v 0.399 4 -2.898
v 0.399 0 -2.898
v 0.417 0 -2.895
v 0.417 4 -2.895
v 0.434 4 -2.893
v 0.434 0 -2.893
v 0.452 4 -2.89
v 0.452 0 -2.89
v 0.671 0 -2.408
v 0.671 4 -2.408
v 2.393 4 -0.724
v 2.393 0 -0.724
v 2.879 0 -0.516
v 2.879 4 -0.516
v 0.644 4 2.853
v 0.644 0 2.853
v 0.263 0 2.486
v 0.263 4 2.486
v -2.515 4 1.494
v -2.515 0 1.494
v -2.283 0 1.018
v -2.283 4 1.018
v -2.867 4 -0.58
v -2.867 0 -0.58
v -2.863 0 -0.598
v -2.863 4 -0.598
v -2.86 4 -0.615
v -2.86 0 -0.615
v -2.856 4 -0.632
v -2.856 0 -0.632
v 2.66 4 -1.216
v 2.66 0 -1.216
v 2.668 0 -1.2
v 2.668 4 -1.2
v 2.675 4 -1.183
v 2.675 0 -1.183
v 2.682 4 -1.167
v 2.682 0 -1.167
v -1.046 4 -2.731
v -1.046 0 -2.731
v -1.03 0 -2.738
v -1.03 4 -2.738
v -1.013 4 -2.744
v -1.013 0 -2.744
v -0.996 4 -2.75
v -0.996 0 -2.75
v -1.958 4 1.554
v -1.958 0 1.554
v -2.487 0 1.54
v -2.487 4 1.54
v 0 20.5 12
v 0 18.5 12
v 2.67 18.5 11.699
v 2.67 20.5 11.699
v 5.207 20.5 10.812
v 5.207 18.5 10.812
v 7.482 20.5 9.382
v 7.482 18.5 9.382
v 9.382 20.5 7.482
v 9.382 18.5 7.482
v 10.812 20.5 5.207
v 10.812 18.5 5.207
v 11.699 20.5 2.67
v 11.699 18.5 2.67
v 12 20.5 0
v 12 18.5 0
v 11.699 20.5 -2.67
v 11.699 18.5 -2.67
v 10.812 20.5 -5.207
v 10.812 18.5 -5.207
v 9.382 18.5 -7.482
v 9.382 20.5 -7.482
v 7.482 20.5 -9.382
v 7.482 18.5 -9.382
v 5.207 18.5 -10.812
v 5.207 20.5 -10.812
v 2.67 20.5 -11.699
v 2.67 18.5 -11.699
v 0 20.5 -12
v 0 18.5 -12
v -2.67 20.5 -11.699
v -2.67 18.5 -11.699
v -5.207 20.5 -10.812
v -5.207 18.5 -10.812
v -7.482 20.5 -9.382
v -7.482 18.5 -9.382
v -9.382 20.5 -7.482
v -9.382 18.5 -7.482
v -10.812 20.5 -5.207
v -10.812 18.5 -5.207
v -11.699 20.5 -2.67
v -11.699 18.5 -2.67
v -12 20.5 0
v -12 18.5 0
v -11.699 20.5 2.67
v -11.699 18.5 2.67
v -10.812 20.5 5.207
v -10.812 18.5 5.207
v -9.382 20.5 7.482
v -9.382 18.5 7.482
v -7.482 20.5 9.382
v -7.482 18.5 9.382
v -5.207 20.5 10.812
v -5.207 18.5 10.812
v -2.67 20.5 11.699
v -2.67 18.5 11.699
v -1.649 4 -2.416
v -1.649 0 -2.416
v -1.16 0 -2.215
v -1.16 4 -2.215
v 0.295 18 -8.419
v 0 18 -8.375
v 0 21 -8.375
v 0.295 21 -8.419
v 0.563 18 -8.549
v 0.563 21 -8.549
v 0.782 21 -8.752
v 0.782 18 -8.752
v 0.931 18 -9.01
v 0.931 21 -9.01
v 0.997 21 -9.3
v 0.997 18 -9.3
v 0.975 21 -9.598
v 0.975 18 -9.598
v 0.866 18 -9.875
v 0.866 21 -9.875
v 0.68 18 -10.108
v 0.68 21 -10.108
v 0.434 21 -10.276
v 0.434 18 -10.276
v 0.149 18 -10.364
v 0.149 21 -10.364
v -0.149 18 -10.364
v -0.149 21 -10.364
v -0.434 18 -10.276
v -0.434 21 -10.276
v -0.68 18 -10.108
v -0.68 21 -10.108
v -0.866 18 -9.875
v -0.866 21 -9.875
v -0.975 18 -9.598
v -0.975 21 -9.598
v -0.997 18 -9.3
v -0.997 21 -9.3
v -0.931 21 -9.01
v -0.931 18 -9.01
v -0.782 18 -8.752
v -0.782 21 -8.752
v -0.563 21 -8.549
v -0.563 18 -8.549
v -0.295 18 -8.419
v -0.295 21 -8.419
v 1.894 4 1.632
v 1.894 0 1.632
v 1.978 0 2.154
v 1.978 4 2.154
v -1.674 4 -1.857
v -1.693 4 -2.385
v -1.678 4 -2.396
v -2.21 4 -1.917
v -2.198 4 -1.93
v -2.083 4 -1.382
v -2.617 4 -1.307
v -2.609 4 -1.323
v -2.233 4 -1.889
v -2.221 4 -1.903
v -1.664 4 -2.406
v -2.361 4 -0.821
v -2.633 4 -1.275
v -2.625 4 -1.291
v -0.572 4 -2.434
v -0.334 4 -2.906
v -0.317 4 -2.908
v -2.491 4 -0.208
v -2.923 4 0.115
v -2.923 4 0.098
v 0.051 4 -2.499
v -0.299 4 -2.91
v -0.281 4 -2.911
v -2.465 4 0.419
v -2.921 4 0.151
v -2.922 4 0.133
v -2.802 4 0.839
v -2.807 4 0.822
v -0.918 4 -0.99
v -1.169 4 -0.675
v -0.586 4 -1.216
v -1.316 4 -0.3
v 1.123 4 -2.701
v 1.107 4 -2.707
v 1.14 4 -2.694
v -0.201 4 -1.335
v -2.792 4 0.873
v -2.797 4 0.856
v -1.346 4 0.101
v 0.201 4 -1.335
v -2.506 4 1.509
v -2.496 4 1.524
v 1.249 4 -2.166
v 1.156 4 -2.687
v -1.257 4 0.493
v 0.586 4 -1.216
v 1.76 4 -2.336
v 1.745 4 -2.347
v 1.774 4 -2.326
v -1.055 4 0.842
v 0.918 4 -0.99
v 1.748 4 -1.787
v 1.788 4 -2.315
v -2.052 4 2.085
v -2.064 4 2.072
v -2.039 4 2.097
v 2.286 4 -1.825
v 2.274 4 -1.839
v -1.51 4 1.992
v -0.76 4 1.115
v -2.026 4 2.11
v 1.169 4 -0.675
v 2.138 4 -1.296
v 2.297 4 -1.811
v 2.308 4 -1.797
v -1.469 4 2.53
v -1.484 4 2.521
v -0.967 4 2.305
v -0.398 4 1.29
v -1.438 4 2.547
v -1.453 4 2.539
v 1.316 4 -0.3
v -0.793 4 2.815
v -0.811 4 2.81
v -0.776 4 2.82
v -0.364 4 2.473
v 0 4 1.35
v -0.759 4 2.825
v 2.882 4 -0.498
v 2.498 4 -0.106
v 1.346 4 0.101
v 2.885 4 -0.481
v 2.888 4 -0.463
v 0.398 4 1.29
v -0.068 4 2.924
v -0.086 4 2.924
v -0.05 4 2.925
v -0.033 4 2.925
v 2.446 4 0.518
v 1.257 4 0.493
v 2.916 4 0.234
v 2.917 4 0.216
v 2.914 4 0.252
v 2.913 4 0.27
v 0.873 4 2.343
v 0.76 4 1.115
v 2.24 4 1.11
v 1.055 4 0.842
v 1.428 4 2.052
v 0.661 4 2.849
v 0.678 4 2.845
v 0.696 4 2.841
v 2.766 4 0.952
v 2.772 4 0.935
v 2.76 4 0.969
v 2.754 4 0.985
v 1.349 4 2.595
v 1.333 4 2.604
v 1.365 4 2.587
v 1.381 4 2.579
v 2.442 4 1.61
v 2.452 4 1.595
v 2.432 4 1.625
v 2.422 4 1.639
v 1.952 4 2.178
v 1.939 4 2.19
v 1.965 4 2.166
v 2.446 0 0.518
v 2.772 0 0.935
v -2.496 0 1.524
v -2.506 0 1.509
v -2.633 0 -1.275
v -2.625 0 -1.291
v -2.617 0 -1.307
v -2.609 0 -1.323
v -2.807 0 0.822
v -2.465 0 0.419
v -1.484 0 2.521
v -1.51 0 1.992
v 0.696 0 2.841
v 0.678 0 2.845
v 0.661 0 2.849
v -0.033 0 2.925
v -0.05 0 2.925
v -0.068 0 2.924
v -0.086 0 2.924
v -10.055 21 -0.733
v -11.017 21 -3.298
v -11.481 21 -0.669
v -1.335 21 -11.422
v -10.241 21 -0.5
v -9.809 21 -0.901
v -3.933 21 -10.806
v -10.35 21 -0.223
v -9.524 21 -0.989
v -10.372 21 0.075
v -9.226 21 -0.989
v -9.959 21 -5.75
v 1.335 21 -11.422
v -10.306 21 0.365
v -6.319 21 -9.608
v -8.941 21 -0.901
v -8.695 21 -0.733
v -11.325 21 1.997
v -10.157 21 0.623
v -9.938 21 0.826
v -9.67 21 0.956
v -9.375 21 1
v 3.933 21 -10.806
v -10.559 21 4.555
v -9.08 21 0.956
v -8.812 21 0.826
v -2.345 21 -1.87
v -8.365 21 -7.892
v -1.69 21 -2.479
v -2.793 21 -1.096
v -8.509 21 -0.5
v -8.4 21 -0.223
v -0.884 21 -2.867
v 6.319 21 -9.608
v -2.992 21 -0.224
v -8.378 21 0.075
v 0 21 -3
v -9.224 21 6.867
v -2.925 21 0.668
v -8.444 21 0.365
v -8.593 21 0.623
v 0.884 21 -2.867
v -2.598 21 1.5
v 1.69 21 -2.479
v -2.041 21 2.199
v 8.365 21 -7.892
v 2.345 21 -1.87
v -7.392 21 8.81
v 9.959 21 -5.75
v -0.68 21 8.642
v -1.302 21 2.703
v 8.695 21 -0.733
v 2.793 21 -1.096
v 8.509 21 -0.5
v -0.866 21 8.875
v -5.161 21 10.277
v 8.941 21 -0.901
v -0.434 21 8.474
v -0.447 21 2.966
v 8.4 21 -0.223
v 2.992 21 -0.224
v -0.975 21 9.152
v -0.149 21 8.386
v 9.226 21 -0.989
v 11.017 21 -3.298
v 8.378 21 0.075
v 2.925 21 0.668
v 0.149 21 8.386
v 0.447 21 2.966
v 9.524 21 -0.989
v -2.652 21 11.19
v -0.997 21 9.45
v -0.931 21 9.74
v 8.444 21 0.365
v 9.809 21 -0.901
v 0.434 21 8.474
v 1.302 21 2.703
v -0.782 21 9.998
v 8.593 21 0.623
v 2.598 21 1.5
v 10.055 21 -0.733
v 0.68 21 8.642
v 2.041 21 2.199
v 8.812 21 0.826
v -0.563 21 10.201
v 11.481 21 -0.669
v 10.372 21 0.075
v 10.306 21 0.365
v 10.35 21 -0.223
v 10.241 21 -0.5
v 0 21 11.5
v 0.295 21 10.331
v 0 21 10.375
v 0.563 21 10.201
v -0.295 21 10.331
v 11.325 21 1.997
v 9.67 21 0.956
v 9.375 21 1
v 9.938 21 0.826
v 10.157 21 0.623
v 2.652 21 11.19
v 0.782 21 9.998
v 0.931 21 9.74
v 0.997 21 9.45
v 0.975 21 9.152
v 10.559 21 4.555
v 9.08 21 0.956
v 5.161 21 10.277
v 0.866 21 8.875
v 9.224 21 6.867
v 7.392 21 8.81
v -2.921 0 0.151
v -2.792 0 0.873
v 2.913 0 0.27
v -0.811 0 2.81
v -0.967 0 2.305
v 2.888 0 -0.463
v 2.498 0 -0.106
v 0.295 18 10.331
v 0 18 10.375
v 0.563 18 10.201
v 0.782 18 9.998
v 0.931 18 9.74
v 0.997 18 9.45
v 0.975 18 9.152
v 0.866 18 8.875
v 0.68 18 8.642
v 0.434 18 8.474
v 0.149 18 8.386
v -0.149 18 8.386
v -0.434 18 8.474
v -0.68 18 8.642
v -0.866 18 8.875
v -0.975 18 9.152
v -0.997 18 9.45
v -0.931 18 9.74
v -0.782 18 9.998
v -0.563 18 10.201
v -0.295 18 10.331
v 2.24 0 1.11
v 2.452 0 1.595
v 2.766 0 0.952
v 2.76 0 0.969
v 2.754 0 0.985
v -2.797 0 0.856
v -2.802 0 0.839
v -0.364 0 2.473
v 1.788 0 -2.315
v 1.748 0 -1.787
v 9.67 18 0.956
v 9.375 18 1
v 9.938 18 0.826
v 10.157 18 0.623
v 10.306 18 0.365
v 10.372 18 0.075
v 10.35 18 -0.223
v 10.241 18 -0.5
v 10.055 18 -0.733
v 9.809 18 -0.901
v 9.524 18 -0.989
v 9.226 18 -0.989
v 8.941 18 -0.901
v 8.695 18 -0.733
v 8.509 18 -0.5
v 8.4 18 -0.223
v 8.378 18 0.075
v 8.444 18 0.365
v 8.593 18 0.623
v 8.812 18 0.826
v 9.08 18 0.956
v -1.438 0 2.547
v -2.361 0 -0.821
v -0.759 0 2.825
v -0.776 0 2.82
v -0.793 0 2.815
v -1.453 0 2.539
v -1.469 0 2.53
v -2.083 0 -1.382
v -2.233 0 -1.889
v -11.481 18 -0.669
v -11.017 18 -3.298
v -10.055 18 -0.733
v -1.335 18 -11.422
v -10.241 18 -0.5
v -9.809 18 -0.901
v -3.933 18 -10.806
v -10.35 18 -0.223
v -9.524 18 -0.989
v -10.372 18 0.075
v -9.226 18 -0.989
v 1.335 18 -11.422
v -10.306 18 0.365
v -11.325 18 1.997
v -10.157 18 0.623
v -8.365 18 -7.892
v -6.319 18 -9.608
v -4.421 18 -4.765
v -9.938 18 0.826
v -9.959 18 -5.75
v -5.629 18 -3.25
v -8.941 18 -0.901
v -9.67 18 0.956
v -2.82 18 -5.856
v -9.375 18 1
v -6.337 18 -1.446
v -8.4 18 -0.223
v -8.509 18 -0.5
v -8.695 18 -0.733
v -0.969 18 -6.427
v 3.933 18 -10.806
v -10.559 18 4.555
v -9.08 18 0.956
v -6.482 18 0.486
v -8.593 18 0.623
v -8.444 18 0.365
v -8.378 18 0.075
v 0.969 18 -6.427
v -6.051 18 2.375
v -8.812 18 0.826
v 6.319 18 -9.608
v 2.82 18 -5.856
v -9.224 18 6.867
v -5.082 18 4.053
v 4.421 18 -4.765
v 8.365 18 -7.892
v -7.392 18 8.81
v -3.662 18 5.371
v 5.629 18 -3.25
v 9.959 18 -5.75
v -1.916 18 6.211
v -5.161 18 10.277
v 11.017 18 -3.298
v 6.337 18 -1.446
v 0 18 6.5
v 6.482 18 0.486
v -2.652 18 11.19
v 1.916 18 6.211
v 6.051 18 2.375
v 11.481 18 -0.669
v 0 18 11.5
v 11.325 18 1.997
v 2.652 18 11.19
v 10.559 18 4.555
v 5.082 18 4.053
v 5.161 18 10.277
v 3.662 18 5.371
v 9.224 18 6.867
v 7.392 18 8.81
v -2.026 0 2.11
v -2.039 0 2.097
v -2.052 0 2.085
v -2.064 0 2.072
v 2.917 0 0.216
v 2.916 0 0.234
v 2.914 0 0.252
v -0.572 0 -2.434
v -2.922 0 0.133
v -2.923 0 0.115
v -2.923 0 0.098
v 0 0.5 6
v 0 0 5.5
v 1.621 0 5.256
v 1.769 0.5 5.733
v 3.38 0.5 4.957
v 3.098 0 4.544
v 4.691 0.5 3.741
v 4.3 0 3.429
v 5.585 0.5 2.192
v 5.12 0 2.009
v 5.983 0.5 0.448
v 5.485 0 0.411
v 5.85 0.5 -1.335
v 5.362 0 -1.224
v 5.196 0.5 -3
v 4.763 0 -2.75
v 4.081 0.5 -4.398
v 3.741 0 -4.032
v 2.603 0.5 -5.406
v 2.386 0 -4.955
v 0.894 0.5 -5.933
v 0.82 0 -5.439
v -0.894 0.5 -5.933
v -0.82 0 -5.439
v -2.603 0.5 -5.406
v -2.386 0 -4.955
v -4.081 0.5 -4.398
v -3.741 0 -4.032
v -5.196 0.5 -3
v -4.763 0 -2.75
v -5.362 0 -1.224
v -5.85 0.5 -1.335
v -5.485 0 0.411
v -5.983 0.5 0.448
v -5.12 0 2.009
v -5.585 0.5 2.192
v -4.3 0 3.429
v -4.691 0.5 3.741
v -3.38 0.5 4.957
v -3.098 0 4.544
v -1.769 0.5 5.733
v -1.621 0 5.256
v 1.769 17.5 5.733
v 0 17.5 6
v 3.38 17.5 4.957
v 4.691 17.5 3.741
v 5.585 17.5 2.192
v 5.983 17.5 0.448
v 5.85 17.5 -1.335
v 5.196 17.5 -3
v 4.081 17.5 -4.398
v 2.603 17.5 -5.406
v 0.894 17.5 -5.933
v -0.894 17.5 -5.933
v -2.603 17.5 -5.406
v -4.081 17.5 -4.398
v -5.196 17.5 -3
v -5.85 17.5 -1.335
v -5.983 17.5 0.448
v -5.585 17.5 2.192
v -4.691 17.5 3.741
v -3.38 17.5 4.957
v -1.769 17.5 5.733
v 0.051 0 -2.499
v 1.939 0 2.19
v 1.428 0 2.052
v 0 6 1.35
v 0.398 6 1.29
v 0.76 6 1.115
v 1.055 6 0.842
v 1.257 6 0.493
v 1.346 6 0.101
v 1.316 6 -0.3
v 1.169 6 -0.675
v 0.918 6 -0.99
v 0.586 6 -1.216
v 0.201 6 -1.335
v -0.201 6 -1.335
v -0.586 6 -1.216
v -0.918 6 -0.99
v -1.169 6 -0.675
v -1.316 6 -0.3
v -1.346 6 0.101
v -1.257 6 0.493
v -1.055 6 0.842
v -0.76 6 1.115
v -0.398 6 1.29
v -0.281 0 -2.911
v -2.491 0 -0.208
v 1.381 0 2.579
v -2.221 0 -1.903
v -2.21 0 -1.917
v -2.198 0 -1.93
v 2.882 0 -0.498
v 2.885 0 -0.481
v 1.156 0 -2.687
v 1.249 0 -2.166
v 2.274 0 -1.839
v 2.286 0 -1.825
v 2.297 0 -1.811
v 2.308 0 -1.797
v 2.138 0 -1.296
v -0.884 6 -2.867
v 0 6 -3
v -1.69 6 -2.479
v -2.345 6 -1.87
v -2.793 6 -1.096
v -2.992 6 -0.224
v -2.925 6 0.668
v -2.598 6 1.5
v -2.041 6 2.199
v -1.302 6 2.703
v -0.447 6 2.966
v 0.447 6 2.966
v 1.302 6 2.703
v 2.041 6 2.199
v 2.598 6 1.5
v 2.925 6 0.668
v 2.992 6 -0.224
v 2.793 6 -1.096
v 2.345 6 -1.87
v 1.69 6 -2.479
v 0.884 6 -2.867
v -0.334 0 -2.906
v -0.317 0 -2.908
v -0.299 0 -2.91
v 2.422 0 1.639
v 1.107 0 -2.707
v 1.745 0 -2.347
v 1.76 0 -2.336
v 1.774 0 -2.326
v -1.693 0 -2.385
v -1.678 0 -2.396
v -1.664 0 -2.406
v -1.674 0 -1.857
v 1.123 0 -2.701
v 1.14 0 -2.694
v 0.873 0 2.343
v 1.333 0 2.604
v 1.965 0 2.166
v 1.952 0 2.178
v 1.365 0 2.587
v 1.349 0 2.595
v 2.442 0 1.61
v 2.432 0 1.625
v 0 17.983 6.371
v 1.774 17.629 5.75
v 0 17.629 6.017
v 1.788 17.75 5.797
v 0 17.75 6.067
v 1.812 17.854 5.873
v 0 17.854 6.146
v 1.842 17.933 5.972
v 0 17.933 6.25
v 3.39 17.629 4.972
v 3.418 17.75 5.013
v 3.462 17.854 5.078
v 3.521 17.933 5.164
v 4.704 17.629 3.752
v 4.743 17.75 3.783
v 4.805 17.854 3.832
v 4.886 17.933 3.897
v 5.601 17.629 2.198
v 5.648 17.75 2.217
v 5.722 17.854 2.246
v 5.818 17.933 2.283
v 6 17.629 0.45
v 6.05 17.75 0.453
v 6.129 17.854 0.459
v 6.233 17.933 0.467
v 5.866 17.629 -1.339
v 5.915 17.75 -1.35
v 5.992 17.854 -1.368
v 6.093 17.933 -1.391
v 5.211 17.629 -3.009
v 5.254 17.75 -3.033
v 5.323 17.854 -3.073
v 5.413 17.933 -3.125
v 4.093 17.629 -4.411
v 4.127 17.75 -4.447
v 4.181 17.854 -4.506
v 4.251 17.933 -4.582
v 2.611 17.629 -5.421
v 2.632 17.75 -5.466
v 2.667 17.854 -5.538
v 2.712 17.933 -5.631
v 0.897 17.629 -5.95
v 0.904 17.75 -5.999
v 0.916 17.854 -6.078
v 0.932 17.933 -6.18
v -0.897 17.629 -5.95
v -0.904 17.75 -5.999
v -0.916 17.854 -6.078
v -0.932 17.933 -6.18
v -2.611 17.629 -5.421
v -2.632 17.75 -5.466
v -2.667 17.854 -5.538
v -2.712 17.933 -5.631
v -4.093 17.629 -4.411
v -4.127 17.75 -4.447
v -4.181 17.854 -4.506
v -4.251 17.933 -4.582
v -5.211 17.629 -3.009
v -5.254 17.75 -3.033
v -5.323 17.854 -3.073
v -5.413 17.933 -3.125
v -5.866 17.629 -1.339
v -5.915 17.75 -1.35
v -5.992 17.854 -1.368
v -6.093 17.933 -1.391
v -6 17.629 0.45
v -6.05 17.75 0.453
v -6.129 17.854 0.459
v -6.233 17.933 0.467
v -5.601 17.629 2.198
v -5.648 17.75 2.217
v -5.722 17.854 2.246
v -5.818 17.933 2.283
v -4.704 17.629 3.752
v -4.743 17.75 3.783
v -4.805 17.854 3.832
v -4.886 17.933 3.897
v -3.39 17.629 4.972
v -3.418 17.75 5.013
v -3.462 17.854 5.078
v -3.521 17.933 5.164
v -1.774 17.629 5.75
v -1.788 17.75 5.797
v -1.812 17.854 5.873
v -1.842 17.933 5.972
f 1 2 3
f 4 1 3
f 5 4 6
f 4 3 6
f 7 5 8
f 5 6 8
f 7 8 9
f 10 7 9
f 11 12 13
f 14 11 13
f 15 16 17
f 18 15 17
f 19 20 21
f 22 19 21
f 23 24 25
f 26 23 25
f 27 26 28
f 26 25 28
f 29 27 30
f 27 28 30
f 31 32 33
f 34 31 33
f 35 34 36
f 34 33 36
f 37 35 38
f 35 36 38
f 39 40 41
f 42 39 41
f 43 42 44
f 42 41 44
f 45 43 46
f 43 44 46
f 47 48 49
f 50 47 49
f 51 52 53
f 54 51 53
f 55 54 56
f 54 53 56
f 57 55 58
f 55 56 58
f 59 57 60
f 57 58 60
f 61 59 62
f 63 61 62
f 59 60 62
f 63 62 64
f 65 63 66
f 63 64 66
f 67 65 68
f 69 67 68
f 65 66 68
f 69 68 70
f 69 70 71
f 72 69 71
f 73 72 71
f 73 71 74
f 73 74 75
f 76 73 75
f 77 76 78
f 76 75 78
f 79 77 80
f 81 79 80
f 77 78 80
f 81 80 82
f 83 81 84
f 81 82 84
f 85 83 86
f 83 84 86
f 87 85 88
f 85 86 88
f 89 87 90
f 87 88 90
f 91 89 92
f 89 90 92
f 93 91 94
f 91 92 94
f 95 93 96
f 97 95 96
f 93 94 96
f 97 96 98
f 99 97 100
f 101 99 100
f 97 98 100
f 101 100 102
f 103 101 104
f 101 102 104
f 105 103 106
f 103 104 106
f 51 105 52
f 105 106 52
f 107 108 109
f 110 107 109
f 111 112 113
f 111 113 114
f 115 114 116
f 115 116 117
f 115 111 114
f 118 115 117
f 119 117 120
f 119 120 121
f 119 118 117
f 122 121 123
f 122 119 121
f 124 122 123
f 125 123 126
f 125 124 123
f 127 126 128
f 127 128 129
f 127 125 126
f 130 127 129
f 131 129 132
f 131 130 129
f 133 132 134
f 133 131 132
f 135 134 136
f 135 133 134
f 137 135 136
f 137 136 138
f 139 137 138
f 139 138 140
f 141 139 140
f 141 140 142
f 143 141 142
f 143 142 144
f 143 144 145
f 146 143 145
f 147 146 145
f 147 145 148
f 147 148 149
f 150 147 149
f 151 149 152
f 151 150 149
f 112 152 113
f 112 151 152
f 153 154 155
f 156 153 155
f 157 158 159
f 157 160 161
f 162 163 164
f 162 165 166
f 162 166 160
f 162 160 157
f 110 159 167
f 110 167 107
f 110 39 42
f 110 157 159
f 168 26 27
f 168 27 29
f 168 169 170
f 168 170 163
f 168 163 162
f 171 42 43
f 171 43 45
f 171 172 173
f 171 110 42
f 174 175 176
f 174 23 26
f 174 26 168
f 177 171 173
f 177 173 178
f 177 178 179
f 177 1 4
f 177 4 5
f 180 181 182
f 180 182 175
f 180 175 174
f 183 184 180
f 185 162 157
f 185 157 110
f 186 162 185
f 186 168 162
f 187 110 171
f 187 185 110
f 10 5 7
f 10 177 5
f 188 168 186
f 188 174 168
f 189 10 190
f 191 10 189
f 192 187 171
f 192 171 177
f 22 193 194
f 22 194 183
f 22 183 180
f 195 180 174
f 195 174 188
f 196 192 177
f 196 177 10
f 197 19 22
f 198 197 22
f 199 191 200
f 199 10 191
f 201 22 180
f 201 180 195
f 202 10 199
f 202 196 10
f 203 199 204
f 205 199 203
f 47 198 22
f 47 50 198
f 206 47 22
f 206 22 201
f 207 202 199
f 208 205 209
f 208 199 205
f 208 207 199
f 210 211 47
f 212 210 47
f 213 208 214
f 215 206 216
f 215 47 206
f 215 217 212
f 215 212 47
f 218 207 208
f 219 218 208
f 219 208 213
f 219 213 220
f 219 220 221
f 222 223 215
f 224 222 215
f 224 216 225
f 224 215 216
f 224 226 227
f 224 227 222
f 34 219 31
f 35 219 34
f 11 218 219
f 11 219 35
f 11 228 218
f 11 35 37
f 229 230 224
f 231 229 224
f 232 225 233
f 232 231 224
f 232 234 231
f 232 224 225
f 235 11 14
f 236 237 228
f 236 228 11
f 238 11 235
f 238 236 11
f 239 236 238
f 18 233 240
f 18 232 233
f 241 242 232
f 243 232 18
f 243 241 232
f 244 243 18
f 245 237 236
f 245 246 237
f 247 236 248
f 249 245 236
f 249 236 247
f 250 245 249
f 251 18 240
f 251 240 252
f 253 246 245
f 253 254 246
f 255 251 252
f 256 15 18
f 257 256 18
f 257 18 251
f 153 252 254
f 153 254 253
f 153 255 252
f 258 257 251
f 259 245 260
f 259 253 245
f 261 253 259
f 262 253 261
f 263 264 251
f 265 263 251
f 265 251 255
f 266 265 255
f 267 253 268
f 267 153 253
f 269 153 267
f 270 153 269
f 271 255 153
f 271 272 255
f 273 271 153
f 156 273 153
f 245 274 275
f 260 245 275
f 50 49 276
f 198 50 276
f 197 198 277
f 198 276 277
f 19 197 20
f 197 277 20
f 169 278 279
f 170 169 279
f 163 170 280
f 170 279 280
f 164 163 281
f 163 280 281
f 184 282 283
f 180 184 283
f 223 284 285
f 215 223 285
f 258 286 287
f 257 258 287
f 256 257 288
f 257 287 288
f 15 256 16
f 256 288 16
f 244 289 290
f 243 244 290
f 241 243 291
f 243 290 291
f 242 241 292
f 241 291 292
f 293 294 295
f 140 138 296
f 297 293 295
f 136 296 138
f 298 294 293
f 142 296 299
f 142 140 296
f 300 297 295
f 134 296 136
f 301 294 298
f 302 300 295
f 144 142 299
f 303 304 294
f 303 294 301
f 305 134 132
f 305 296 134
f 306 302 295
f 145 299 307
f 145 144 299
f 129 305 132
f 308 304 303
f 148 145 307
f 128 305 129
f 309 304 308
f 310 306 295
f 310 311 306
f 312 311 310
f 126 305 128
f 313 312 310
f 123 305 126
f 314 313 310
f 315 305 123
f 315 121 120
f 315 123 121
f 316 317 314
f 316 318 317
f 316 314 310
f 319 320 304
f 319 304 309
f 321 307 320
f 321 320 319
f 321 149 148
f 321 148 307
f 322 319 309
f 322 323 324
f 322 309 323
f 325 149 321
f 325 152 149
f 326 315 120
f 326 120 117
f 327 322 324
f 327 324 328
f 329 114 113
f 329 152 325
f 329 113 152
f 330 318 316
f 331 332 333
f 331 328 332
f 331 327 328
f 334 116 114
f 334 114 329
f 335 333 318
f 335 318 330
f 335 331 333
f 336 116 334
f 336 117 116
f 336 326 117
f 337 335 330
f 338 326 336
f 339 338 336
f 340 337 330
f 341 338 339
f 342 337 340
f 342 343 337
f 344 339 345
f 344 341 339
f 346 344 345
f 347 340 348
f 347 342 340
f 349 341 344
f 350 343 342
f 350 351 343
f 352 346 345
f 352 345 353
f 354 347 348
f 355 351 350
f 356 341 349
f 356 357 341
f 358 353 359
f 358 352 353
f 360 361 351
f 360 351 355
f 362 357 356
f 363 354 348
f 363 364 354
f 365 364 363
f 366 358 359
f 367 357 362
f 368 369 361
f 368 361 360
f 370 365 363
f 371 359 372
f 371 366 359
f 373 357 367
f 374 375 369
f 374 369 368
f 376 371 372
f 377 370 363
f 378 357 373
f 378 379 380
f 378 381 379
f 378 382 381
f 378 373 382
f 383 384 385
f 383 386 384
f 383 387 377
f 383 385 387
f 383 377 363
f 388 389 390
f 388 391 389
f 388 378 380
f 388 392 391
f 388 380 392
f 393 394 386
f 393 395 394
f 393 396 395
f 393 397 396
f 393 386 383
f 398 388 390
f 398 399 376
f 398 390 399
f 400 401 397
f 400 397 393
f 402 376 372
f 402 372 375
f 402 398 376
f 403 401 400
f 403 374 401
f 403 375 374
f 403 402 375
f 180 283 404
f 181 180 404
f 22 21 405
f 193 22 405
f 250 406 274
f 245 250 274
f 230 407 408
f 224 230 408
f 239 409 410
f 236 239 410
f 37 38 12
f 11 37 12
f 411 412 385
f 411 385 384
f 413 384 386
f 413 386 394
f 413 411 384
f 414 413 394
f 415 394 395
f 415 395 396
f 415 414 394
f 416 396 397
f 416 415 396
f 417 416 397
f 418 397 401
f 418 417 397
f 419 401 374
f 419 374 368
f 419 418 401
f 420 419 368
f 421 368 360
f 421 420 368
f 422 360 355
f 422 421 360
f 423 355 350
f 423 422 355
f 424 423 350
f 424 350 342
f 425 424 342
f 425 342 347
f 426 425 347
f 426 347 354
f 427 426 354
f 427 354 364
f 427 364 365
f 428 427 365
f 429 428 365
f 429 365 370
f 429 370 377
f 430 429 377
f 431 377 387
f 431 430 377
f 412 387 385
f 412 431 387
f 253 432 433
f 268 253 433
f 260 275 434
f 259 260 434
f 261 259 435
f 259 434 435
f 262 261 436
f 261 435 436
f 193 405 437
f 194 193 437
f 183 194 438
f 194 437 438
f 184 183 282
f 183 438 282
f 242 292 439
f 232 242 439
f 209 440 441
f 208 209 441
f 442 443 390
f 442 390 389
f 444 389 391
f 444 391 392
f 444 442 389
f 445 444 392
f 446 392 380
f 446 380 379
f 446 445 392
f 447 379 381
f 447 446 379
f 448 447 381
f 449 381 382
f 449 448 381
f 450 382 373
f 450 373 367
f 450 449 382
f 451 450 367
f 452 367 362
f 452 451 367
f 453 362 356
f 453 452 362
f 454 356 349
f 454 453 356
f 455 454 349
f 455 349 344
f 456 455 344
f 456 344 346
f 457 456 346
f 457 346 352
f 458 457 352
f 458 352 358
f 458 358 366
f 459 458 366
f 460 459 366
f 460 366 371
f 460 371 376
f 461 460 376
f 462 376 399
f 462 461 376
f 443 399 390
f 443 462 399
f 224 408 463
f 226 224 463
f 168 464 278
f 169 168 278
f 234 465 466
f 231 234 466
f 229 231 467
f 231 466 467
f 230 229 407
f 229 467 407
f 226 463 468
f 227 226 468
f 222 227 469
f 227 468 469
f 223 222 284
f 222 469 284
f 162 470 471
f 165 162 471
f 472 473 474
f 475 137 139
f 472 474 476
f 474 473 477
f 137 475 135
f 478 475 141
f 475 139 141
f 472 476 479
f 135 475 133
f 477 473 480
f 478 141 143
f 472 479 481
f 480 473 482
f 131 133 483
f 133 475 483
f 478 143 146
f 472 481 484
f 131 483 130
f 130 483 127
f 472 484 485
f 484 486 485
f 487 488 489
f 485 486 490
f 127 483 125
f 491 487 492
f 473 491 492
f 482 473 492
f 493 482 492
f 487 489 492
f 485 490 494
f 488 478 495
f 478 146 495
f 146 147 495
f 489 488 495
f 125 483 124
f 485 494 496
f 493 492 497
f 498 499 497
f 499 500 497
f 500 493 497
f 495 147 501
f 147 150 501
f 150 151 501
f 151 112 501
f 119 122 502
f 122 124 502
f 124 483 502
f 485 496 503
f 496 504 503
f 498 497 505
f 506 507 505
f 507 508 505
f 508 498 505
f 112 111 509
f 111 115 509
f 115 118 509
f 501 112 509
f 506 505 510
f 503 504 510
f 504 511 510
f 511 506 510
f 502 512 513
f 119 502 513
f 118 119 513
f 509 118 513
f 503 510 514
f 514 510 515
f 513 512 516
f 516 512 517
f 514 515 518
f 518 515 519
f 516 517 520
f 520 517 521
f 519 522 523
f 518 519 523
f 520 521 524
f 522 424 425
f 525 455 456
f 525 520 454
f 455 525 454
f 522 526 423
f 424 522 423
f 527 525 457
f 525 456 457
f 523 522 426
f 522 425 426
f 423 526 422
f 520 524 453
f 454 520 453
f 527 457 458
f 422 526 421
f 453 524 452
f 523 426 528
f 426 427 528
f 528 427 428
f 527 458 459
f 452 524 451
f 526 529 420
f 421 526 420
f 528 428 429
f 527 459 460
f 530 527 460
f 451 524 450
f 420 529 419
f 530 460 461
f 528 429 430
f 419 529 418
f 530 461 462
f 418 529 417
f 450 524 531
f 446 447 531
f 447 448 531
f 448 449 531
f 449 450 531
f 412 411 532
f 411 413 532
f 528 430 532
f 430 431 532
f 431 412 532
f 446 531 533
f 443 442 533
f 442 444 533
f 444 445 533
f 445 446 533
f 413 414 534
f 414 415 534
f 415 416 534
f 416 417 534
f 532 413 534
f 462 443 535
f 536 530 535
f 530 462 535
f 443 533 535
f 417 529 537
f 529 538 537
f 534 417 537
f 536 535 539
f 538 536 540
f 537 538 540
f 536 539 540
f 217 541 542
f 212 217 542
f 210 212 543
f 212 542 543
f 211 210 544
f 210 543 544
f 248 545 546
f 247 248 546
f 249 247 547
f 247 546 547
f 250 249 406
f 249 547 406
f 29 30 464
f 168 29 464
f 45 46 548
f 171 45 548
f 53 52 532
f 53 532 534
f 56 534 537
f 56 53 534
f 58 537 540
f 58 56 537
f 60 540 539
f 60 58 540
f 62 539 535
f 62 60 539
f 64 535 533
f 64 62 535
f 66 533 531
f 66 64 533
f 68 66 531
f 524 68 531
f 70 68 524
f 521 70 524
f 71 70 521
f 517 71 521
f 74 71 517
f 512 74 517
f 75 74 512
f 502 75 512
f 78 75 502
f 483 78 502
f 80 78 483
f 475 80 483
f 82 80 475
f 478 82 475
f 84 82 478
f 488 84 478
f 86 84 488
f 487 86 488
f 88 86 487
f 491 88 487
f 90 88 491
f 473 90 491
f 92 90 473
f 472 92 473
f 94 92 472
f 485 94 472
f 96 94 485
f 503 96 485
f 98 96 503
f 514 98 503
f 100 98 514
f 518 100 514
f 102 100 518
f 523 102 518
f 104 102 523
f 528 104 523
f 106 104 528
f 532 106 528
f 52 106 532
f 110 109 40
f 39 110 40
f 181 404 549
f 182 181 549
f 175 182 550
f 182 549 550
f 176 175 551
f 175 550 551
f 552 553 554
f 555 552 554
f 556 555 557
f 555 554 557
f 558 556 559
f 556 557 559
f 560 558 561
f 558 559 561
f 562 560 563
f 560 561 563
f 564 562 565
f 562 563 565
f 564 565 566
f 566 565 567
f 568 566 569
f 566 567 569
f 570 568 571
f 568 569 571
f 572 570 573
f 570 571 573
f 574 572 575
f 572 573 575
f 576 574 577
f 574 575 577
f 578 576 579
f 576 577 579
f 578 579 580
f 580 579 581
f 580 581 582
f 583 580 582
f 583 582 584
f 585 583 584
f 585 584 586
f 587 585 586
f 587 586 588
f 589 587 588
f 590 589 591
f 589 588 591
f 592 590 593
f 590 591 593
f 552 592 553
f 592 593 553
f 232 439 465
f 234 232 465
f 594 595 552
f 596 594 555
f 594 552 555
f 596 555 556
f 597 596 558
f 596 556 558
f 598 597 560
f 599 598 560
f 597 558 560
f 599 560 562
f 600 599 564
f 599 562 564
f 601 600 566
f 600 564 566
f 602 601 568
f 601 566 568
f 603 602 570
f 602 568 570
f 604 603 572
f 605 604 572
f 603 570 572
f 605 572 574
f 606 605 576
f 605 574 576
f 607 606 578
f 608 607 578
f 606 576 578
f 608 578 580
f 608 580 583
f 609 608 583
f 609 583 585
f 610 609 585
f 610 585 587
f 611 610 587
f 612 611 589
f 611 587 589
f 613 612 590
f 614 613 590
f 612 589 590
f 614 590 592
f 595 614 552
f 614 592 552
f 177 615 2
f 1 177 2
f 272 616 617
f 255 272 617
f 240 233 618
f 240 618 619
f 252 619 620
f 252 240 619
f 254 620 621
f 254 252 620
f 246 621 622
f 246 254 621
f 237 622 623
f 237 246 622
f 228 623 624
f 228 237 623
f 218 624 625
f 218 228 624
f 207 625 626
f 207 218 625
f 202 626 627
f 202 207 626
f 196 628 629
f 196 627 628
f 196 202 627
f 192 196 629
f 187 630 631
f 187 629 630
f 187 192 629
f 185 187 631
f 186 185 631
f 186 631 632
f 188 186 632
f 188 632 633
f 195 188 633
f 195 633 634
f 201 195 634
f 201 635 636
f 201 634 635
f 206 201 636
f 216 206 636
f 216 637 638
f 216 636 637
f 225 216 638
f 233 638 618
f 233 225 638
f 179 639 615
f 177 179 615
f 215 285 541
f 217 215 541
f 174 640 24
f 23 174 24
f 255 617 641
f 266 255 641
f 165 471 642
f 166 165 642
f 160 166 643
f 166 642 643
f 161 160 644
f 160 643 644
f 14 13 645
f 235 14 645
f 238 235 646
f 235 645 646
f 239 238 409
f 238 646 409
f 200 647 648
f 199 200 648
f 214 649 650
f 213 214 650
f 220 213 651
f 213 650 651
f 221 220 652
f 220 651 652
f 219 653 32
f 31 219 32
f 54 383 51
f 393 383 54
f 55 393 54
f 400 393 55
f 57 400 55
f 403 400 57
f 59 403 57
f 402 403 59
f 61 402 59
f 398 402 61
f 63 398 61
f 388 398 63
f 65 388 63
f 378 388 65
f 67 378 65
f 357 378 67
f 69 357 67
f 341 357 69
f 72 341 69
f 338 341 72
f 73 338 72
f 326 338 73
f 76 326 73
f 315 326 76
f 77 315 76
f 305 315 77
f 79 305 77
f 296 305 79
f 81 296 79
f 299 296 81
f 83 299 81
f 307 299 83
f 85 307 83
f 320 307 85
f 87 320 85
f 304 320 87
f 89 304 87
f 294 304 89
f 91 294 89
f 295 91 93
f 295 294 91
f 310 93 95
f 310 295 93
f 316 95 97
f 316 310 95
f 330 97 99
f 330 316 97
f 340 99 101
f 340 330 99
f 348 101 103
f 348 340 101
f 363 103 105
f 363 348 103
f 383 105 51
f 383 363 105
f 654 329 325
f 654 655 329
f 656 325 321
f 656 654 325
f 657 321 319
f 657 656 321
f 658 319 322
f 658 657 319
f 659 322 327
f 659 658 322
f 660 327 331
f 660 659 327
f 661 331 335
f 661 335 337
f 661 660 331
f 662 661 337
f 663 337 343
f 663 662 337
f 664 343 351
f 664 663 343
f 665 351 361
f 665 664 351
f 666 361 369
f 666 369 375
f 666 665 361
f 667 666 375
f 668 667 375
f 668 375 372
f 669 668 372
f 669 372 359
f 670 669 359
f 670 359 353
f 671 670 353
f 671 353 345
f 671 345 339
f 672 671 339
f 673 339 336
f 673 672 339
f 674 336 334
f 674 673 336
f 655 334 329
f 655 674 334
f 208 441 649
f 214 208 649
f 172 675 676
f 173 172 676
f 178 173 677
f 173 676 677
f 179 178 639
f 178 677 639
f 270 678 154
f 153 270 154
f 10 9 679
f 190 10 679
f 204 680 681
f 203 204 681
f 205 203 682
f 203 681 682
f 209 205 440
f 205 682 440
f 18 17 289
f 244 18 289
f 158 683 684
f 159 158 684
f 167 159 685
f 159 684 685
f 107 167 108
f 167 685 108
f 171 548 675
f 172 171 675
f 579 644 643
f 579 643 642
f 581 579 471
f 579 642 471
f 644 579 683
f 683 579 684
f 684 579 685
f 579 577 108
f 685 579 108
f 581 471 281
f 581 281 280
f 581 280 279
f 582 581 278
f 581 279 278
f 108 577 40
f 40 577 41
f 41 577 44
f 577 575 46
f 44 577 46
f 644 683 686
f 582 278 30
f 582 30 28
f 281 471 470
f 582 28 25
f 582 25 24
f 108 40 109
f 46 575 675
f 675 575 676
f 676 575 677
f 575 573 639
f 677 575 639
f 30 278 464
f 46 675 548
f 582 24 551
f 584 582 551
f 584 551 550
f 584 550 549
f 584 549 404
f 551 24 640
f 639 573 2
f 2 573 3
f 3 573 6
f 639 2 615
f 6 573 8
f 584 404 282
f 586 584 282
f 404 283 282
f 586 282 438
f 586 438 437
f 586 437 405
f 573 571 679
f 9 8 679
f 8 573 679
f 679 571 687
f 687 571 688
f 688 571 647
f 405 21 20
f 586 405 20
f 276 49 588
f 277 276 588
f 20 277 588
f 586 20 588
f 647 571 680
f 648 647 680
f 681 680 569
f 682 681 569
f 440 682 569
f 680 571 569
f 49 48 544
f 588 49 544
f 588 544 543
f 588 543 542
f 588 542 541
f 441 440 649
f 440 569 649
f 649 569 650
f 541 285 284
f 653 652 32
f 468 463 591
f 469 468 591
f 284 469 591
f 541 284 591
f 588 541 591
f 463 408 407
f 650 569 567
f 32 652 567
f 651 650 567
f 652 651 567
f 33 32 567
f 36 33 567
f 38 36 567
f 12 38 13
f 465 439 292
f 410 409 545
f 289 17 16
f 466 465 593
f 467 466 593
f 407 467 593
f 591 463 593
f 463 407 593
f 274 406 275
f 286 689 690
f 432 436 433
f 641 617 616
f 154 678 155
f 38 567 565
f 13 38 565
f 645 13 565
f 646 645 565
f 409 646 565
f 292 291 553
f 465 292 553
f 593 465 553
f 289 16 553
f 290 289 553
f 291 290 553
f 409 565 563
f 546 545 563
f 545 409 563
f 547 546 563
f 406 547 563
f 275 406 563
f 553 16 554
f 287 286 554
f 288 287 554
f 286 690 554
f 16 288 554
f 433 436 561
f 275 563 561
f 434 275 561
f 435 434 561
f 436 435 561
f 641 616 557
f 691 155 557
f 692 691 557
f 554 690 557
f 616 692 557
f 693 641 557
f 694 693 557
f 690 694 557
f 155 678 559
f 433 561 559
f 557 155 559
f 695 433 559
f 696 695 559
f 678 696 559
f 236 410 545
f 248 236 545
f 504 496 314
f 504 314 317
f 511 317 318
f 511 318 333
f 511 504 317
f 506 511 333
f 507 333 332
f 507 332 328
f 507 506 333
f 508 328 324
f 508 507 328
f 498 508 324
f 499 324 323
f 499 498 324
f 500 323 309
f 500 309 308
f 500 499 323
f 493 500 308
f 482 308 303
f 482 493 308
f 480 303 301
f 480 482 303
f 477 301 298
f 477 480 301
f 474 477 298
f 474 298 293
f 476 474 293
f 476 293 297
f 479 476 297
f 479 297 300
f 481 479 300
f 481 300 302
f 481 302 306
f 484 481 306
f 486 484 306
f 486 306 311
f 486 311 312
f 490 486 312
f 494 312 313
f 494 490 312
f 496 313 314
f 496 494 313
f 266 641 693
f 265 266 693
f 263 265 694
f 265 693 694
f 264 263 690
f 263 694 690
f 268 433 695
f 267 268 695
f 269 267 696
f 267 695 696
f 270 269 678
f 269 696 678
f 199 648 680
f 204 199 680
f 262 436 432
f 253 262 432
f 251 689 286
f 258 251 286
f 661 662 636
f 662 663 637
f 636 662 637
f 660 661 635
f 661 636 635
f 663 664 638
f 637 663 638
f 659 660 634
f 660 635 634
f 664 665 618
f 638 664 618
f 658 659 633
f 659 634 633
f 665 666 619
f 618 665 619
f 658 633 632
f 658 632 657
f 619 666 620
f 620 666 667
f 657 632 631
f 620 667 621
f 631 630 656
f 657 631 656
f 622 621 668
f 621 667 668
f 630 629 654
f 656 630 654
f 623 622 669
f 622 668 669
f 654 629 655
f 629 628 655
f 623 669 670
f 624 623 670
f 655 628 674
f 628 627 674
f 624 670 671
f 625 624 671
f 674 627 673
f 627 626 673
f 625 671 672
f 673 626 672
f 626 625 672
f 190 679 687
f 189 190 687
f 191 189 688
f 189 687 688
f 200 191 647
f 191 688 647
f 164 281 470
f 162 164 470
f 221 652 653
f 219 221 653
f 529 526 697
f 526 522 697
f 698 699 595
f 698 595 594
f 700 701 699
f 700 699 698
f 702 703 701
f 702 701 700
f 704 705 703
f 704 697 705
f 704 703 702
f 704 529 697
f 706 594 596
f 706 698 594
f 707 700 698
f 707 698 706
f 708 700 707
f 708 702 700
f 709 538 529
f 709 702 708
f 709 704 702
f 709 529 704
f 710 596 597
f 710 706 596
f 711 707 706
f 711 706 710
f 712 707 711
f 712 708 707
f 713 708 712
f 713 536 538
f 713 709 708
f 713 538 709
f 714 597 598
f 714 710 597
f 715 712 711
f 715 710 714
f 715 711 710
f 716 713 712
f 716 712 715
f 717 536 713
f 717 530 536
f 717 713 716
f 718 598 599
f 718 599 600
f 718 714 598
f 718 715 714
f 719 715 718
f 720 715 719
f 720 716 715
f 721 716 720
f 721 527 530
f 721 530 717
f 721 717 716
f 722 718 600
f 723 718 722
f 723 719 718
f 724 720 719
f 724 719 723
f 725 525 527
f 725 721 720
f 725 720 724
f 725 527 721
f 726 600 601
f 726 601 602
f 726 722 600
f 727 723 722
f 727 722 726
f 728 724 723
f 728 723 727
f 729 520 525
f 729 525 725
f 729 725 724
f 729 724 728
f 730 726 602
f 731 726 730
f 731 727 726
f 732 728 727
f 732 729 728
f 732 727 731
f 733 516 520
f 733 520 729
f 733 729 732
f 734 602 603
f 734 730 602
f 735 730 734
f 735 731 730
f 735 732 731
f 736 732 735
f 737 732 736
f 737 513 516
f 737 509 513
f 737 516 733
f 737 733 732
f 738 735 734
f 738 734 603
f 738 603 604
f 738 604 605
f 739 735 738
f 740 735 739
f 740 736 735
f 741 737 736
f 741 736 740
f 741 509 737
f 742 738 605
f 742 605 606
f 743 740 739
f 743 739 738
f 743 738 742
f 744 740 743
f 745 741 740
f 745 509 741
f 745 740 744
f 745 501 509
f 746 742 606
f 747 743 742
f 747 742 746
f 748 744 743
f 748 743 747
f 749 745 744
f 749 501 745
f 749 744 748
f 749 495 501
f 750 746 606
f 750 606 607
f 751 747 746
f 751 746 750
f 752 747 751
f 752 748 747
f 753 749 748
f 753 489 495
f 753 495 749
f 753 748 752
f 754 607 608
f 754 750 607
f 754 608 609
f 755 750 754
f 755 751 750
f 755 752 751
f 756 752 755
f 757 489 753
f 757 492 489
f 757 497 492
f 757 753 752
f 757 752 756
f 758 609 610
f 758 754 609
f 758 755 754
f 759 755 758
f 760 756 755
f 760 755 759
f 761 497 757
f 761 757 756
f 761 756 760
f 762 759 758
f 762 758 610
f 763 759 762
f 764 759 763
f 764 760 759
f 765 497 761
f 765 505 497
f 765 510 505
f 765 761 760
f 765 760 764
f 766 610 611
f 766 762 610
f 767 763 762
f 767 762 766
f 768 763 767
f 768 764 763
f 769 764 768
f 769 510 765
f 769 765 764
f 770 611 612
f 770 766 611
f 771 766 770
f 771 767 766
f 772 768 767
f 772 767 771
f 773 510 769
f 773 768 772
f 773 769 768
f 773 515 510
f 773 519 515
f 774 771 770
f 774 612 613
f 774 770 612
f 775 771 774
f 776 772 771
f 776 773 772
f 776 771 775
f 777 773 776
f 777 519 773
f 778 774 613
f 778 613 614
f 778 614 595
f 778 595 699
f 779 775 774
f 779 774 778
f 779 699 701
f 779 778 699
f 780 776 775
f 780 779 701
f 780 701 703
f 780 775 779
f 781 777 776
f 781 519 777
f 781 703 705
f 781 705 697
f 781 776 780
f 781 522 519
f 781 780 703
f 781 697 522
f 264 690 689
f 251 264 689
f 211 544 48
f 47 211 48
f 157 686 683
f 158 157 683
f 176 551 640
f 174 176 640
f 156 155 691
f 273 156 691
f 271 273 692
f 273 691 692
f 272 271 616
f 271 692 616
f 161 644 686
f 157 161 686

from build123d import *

# Parameters (mm, degrees)
SKETCH1_R                            = 6
SKETCH1_R_2                          = 1.35
EIXO_DEPTH                           = 18
SKETCH2_R                            = 1.5
REBAIXO_DE_ENCAIXE_NO_SERVO_DEPTH    = 4
REBAIXO_START                        = -2
SKETCH3_R                            = 3
REBAIXO_DE_ENCAIXE_DO_PARAFUSO_DEPTH = 15.370705544
SKETCH4_R                            = 12
SKETCH4_R_2                          = 3
SKETCH4_R_3                          = 1
CORPO_DE_FIXA_O_NO_ANTEBRA_O_DEPTH   = 3
RAIO_DE_AL_VIO_0_5MM_R               = 0.5
CHANFROS_0_5MM_SIZE                  = 0.5
ENCAIXE_DA_ENGRENAGEM_DO_SERVO_DEPTH = 4


with BuildPart() as part:
    # Sketch1 → Eixo (new body)
    with BuildSketch(Plane(origin=(0, 0, 0), x_dir=(1, 0, 0), z_dir=(0, 1, 0))):
        with Locations(Location((0, 0, 0), (0, 0, 270))):
            Circle(SKETCH1_R)
        with Locations(Location((0, 0, 0), (0, 0, 270))):
            Circle(SKETCH1_R_2, mode=Mode.SUBTRACT)
    extrude(amount=EIXO_DEPTH)

    # Sketch2 → Rebaixo de Encaixe no Servo (cut)
    with BuildSketch(Plane.XZ):
        with Locations(Location((0, 0, 0), (0, 0, 270))):
            Circle(SKETCH2_R)
    extrude(amount=-REBAIXO_DE_ENCAIXE_NO_SERVO_DEPTH, mode=Mode.SUBTRACT)

    # Sketch3 → Rebaixo de Encaixe do Parafuso (cut, through all)
    with BuildSketch(Plane.XZ.offset(-4).offset(REBAIXO_START)):
        with Locations(Location((0, 0, 0), (0, 0, 270))):
            Circle(SKETCH3_R)
    extrude(amount=-REBAIXO_DE_ENCAIXE_DO_PARAFUSO_DEPTH, mode=Mode.SUBTRACT)

    # Sketch4 → Corpo de Fixação no Antebraço (add)
    with BuildSketch(Plane(origin=(0, 18, 0), x_dir=(1, 0, 0), z_dir=(0, 1, 0))):
        with Locations(Location((0, 0, 0), (0, 0, 270))):
            Circle(SKETCH4_R)
        with Locations(Location((0, 0, 0), (0, 0, 90))):
            Circle(SKETCH4_R_2, mode=Mode.SUBTRACT)
        with Locations(Location((0, 9.375, 0), (0, 0, 270))):
            Circle(SKETCH4_R_3, mode=Mode.SUBTRACT)
        with Locations(Location((9.375, 0, 0), (0, 0, 270))):
            Circle(SKETCH4_R_3, mode=Mode.SUBTRACT)
        with Locations(Location((0, -9.375, 0), (0, 0, 270))):
            Circle(SKETCH4_R_3, mode=Mode.SUBTRACT)
        with Locations(Location((-9.375, 0, 0), (0, 0, 270))):
            Circle(SKETCH4_R_3, mode=Mode.SUBTRACT)
    extrude(amount=CORPO_DE_FIXA_O_NO_ANTEBRA_O_DEPTH)

    # Raio de Alívio - 0.5mm
    raio_de_al_vio_0_5mm_edges = [part.edges().sort_by_distance(p)[0] for p in [
        (0, 18, -6),
    ]]
    fillet(raio_de_al_vio_0_5mm_edges, radius=RAIO_DE_AL_VIO_0_5MM_R)

    # Chanfros 0.5mm
    chanfros_0_5mm_edges = [part.edges().sort_by_distance(p)[0] for p in [
        (0, 0, -6),
        (0, 21, -12),
        (0, 18, -12),
    ]]
    chamfer(chanfros_0_5mm_edges, length=CHANFROS_0_5MM_SIZE)

    # Sketch6 → Encaixe da Engrenagem do Servo (cut)
    with BuildSketch(Plane.XZ):
        with BuildLine():
            Line((-1.674039734, -1.856768959), (-1.692843967, -2.385352029))
            ThreePointArc((-1.692843967, -2.385352029), (-1.670905751, -2.400770495), (-1.648827112, -2.415987201))
            Line((-1.648827112, -2.415987201), (-1.159687035, -2.214751901))
            Line((-1.159687035, -2.214751901), (-1.046447234, -2.731404984))
            ThreePointArc((-1.046447234, -2.731404984), (-1.02136383, -2.740883238), (-0.996194592, -2.750131149))
            Line((-0.996194592, -2.750131149), (-0.572466934, -2.433573835))
            Line((-0.572466934, -2.433573835), (-0.334298372, -2.905833718))
            ThreePointArc((-0.334298372, -2.905833718), (-0.307645864, -2.908776207), (-0.280967502, -2.911474242))
            Line((-0.280967502, -2.911474242), (0.05072337, -2.499485375))
            Line((0.05072337, -2.499485375), (0.398855685, -2.897678233))
            ThreePointArc((0.398855685, -2.897678233), (0.425402623, -2.893900069), (0.45191381, -2.889878701))
            Line((0.45191381, -2.889878701), (0.670726538, -2.408345057))
            Line((0.670726538, -2.408345057), (1.106948173, -2.707450968))
            ThreePointArc((1.106948173, -2.707450968), (1.131721499, -2.697189546), (1.156399715, -2.686701453))
            Line((1.156399715, -2.686701453), (1.248585491, -2.165879561))
            Line((1.248585491, -2.165879561), (1.745487037, -2.3471046))
            ThreePointArc((1.745487037, -2.3471046), (1.766930151, -2.331004685), (1.788224772, -2.314708872))
            Line((1.788224772, -2.314708872), (1.747991225, -1.787323887))
            Line((1.747991225, -1.787323887), (2.27435053, -1.839281019))
            ThreePointArc((2.27435053, -1.839281019), (2.291116083, -1.818354227), (2.307689091, -1.79727462))
            Line((2.307689091, -1.79727462), (2.137564242, -1.29646408))
            Line((2.137564242, -1.29646408), (2.660308215, -1.215888647))
            ThreePointArc((2.660308215, -1.215888647), (2.671342766, -1.191449885), (2.682152817, -1.166910993))
            Line((2.682152817, -1.166910993), (2.392826237, -0.724142666))
            Line((2.392826237, -0.724142666), (2.879108951, -0.51609752))
            ThreePointArc((2.879108951, -0.51609752), (2.883719158, -0.489682365), (2.888087017, -0.463226057))
            Line((2.888087017, -0.463226057), (2.497738158, -0.106320706))
            Line((2.497738158, -0.106320706), (2.917004683, 0.216121913))
            ThreePointArc((2.917004683, 0.216121913), (2.91490087, 0.242853699), (2.912552089, 0.269565076))
            Line((2.912552089, 0.269565076), (2.445708005, 0.518181775))
            Line((2.445708005, 0.518181775), (2.771614282, 0.934761611))
            ThreePointArc((2.771614282, 0.934761611), (2.76292864, 0.960130372), (2.754010801, 0.985418444))
            Line((2.754010801, 0.985418444), (2.240005024, 1.11012499))
            Line((2.240005024, 1.11012499), (2.452073163, 1.594666799))
            ThreePointArc((2.452073163, 1.594666799), (2.437351442, 1.617078523), (2.422424885, 1.639354347))
            Line((2.422424885, 1.639354347), (1.893554289, 1.632314968))
            Line((1.893554289, 1.632314968), (1.97845927, 2.154373208))
            ThreePointArc((1.97845927, 2.154373208), (1.958626489, 2.172419682), (1.938629106, 2.190283587))
            Line((1.938629106, 2.190283587), (1.428124573, 2.051940594))
            Line((1.428124573, 2.051940594), (1.380531504, 2.578712424))
            ThreePointArc((1.380531504, 2.578712424), (1.356833831, 2.591259724), (1.333022129, 2.603589254))
            Line((1.333022129, 2.603589254), (0.872960539, 2.342635246))
            Line((0.872960539, 2.342635246), (0.695859866, 2.841021655))
            ThreePointArc((0.695859866, 2.841021655), (0.669786312, 2.847281387), (0.64365647, 2.853301833))
            Line((0.64365647, 2.853301833), (0.262945183, 2.48613351))
            Line((0.262945183, 2.48613351), (-0.032535206, 2.924819047))
            ThreePointArc((-0.032535206, 2.924819047), (-0.059346343, 2.924397889), (-0.086152492, 2.923730964))
            Line((-0.086152492, 2.923730964), (-0.363591985, 2.473418862))
            Line((-0.363591985, 2.473418862), (-0.758885972, 2.824839302))
            ThreePointArc((-0.758885972, 2.824839302), (-0.784750049, 2.817763716), (-0.810548177, 2.810451326))
            Line((-0.810548177, 2.810451326), (-0.967283332, 2.305290211))
            Line((-0.967283332, 2.305290211), (-1.437553141, 2.547364514))
            ThreePointArc((-1.437553141, 2.547364514), (-1.460845024, 2.534079086), (-1.484014138, 2.520580694))
            Line((-1.484014138, 2.520580694), (-1.51019671, 1.992311697))
            Line((-1.51019671, 1.992311697), (-2.025893559, 2.109829445))
            ThreePointArc((-2.025893559, 2.109829445), (-2.045149734, 2.091168948), (-2.064234034, 2.072332708))
            Line((-2.064234034, 2.072332708), (-1.958218874, 1.554148912))
            Line((-1.958218874, 1.554148912), (-2.486939634, 1.539726033))
            ThreePointArc((-2.486939634, 1.539726033), (-2.500950163, 1.516862973), (-2.514750513, 1.493872437))
            Line((-2.514750513, 1.493872437), (-2.283198945, 1.018333235))
            Line((-2.283198945, 1.018333235), (-2.791722146, 0.872875971))
            ThreePointArc((-2.791722146, 0.872875971), (-2.799606697, 0.84724692), (-2.807255969, 0.821546666))
            Line((-2.807255969, 0.821546666), (-2.464717229, 0.418531936))
            Line((-2.464717229, 0.418531936), (-2.921090488, 0.151179902))
            ThreePointArc((-2.921090488, 0.151179902), (-2.922353645, 0.124395226), (-2.923371208, 0.097600096))
            Line((-2.923371208, 0.097600096), (-2.491368265, -0.207567264))
            Line((-2.491368265, -0.207567264), (-2.866915971, -0.580015356))
            ThreePointArc((-2.866915971, -0.580015356), (-2.861478366, -0.606272677), (-2.855800283, -0.632479046))
            Line((-2.855800283, -0.632479046), (-2.36147747, -0.82062425))
            Line((-2.36147747, -0.82062425), (-2.632602581, -1.274766117))
            ThreePointArc((-2.632602581, -1.274766117), (-2.620805878, -1.298846238), (-2.608788923, -1.322817204))
            Line((-2.608788923, -1.322817204), (-2.083206361, -1.382118395))
            Line((-2.083206361, -1.382118395), (-2.232873088, -1.889418634))
            ThreePointArc((-2.232873088, -1.889418634), (-2.215458518, -1.909808513), (-2.19785776, -1.930037892))
            Line((-2.19785776, -1.930037892), (-1.674039734, -1.856768959))
        make_face()
    extrude(amount=-ENCAIXE_DA_ENGRENAGEM_DO_SERVO_DEPTH, mode=Mode.SUBTRACT)


solid = part.part
